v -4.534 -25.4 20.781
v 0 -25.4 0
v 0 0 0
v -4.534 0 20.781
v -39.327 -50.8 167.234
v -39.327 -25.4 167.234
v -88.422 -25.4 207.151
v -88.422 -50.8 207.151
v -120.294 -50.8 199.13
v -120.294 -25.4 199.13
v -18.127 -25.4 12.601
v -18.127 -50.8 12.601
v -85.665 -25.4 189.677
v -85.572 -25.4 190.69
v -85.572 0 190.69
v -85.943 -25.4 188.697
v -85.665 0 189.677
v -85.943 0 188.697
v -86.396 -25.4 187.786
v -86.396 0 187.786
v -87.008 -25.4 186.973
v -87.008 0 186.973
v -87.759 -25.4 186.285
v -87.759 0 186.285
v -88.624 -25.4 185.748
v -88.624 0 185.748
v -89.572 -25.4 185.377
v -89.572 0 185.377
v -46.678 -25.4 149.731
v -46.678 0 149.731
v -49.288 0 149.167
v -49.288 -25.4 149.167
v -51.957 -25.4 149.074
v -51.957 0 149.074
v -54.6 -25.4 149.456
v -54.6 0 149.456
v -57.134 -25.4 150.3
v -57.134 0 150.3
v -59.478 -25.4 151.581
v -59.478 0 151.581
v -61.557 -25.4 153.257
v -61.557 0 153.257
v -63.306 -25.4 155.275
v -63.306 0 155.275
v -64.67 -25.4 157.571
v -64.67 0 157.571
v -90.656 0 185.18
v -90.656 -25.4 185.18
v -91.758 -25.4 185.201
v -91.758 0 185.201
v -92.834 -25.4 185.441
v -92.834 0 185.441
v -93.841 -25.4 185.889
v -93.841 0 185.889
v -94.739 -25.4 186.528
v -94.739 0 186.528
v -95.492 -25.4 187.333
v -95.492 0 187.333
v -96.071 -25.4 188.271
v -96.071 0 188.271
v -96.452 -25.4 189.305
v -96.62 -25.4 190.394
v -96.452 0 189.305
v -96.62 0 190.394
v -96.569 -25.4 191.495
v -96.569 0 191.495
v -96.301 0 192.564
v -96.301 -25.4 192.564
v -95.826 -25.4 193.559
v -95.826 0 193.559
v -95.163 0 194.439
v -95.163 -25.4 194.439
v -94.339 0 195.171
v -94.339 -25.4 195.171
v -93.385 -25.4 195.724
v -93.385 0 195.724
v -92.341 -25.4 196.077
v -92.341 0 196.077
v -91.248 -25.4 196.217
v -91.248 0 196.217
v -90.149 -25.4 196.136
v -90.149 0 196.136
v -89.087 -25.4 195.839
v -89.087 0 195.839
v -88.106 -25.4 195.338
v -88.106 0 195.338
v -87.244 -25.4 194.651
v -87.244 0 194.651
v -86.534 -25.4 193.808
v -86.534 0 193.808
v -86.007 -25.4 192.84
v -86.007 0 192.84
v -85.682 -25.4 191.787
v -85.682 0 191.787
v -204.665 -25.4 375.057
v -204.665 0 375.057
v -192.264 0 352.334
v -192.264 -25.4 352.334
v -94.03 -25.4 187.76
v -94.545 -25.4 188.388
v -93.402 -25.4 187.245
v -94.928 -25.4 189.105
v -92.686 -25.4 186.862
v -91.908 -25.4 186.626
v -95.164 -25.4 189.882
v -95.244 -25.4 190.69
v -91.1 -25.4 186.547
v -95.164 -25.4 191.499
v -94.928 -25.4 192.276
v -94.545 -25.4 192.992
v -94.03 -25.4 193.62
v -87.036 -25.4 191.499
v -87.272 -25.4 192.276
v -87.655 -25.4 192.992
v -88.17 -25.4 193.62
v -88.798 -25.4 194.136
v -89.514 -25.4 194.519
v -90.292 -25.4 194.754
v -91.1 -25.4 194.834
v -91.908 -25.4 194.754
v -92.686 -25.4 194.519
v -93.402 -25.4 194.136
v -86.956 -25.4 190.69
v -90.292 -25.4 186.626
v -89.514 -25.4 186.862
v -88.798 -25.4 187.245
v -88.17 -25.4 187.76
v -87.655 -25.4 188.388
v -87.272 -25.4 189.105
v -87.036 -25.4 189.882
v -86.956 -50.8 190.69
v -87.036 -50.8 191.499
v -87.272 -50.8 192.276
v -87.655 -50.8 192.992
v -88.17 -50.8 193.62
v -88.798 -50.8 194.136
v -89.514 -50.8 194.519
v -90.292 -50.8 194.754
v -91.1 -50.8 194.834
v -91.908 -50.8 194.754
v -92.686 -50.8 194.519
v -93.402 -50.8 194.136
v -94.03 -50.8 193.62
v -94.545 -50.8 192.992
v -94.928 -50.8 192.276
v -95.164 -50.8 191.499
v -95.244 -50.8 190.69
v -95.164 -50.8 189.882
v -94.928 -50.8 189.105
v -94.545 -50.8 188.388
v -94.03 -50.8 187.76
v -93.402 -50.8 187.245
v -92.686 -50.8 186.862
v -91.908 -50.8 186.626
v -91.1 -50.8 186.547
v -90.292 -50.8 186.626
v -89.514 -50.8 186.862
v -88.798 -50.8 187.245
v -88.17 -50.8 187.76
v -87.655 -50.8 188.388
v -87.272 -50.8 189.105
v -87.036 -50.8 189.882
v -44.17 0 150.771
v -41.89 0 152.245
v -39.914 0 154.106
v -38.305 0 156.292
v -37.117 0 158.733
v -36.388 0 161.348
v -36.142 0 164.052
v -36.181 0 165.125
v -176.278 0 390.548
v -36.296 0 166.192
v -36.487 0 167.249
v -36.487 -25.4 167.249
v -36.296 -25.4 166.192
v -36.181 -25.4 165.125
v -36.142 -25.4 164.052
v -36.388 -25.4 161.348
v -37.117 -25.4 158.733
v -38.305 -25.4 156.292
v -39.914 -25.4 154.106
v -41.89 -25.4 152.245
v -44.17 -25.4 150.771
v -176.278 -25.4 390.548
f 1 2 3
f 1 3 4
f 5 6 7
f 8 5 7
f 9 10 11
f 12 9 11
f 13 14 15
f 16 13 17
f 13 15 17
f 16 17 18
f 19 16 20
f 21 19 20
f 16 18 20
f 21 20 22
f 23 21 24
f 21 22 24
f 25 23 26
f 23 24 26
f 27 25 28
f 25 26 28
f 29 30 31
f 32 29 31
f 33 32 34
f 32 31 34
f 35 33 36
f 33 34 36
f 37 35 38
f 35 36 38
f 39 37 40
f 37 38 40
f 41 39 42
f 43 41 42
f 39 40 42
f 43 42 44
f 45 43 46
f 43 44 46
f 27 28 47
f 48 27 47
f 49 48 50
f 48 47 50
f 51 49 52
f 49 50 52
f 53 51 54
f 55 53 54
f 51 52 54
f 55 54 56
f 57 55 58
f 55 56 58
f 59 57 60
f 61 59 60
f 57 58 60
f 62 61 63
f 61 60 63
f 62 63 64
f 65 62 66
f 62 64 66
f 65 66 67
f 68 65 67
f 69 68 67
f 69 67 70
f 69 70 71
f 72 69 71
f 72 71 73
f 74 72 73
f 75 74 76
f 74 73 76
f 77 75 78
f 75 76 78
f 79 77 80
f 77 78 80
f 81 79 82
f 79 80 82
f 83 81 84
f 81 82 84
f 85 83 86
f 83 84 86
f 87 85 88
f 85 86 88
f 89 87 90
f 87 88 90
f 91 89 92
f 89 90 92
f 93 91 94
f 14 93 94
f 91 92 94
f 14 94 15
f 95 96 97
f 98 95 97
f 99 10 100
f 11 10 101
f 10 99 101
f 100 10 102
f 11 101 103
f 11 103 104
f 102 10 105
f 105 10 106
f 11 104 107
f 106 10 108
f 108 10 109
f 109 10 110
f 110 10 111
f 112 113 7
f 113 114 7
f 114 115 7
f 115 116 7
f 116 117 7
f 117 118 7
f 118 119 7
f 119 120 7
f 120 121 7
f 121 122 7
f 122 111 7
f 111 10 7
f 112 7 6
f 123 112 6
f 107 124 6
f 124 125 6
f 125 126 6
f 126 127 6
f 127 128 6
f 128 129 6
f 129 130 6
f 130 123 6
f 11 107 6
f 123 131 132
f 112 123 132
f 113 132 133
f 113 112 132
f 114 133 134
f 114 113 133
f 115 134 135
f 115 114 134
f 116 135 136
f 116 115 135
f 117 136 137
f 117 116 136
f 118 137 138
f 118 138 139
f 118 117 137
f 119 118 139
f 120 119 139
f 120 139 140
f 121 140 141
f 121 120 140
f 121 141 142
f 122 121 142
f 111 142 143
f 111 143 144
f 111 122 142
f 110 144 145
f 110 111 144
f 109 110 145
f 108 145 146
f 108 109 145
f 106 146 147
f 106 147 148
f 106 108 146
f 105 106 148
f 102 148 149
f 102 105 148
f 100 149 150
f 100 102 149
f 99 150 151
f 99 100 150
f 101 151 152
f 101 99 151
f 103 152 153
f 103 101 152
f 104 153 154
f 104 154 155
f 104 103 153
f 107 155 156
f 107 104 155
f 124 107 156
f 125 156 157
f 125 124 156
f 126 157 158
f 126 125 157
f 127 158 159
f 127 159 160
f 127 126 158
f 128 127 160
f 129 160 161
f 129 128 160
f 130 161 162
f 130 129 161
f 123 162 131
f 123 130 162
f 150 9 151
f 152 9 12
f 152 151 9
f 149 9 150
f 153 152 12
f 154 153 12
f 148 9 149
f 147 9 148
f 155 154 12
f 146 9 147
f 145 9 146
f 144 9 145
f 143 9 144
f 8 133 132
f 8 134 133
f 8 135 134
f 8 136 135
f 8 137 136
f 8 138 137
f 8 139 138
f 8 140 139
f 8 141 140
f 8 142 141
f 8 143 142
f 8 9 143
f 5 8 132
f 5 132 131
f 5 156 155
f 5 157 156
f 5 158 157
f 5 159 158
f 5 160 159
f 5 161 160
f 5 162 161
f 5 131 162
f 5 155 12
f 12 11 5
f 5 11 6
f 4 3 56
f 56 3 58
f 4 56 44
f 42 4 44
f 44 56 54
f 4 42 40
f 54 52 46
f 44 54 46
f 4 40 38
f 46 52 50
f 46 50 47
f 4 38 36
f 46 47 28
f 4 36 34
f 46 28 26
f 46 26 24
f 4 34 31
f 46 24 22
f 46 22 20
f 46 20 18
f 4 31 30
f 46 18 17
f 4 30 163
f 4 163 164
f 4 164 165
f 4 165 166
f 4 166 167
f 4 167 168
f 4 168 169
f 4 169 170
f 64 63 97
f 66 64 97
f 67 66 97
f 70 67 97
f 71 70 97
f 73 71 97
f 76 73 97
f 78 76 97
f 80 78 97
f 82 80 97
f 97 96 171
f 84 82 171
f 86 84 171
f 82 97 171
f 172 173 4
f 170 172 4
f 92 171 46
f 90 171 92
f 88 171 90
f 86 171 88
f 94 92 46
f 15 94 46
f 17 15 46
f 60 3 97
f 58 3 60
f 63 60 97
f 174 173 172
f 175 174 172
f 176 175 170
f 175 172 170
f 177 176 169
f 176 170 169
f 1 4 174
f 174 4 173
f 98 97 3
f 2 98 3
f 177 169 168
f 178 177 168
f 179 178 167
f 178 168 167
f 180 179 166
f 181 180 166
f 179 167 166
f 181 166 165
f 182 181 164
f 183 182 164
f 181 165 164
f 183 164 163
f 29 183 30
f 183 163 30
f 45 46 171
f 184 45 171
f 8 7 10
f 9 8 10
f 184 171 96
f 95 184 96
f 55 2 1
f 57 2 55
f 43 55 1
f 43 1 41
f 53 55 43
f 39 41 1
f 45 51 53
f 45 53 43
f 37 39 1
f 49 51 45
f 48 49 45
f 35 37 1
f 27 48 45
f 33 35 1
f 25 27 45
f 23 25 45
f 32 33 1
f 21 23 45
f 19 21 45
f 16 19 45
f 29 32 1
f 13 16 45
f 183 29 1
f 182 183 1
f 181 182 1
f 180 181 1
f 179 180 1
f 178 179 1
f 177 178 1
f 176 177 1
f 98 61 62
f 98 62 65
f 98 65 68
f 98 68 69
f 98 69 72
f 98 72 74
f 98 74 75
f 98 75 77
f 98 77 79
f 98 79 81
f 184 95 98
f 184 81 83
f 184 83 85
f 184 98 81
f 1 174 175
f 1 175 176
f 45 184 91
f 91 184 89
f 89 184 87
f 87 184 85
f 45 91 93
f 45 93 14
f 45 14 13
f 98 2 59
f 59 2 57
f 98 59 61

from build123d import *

# Parameters (mm, degrees)
F1_DEPTH = 25.4
F2_R     = 4.1437119387
F3_DEPTH = 25.4


with BuildPart() as f1:
    # F0 (on Front) → F1 (new body)
    with BuildSketch(Plane.XZ):
        with BuildLine():
            ThreePointArc((-9.9044003678, 18.1502769969), (-8.0547579946, 19.032872048), (-6.2147079202, 19.9352947077))
            Line((-6.2147079202, 19.9352947077), (-46.6778621011, 149.7314031902))
            ThreePointArc((-46.6778621011, 149.7314031902), (-57.1339785141, 150.3004031741), (-64.6699537882, 157.5711120868))
            Line((-64.6699537882, 157.5711120868), (-164.7902710869, 366.5667436756))
            ThreePointArc((-164.7902710869, 366.5667436756), (-178.8165155484, 360.0083247343), (-192.2644245511, 352.3335520235))
            Line((-192.2644245511, 352.3335520235), (-76.6598464682, 140.4827547622))
            Line((-76.6598464682, 140.4827547622), (-9.9044003678, 18.1502769969))
        make_face()
        with BuildLine():
            ThreePointArc((-85.5717222096, 190.690279007), (-86.6835987436, 187.3650239492), (-89.5719777393, 185.3773475663))
            ThreePointArc((-89.5719777393, 185.3773475663), (-95.5164605511, 194.0155340647), (-85.5717222096, 190.690279007))
        make_face(mode=Mode.SUBTRACT)
        with BuildLine():
            Line((-46.6778621011, 149.7314031902), (-6.2147079202, 19.9352947077))
            ThreePointArc((-6.2147079202, 19.9352947077), (-5.3731283227, 20.3562515873), (-4.5336362392, 20.7813562276))
            Line((-4.5336362392, 20.7813562276), (-36.486815996, 167.2488662127))
            ThreePointArc((-36.486815996, 167.2488662127), (-36.2285449069, 165.6595376261), (-36.1421225965, 164.051681757))
            ThreePointArc((-36.1421225965, 164.051681757), (-39.0598234065, 155.1624722148), (-46.6778621011, 149.7314031902))
        make_face()
        with BuildLine():
            ThreePointArc((-192.2644245511, 352.3335520235), (-178.8165155484, 360.0083247343), (-164.7902710869, 366.5667436756))
            Line((-164.7902710869, 366.5667436756), (-176.2783657361, 390.547506639))
            Line((-176.2783657361, 390.547506639), (-204.6646028757, 375.0574588776))
            Line((-204.6646028757, 375.0574588776), (-192.2644245511, 352.3335520235))
        make_face()
        with BuildLine():
            Line((-9.9044003678, 18.1502769969), (0, 0))
            Line((0, 0), (-6.2147079202, 19.9352947077))
            ThreePointArc((-6.2147079202, 19.9352947077), (-8.0547579946, 19.032872048), (-9.9044003678, 18.1502769969))
        make_face()
        with BuildLine():
            Line((-6.2147079202, 19.9352947077), (0, 0))
            Line((0, 0), (-4.5336362392, 20.7813562276))
            ThreePointArc((-4.5336362392, 20.7813562276), (-5.3731283227, 20.3562515873), (-6.2147079202, 19.9352947077))
        make_face()
    extrude(amount=F1_DEPTH)


with BuildPart() as f3:
    # F2 (on face) → F3 (new body)
    with BuildSketch(Plane.XZ.offset(25.4)):
        Polygon((-120.2942579985, 199.1302073002), (-18.1274960699, 12.6008201535), (-39.3269173801, 167.2339737415), (-88.4215508565, 207.1512588988), align=None)
        with Locations((-91.1000296474, 190.690279007)):
            Circle(F2_R, mode=Mode.SUBTRACT)
    extrude(amount=F3_DEPTH)


solid = Compound([f1.part, f3.part])
